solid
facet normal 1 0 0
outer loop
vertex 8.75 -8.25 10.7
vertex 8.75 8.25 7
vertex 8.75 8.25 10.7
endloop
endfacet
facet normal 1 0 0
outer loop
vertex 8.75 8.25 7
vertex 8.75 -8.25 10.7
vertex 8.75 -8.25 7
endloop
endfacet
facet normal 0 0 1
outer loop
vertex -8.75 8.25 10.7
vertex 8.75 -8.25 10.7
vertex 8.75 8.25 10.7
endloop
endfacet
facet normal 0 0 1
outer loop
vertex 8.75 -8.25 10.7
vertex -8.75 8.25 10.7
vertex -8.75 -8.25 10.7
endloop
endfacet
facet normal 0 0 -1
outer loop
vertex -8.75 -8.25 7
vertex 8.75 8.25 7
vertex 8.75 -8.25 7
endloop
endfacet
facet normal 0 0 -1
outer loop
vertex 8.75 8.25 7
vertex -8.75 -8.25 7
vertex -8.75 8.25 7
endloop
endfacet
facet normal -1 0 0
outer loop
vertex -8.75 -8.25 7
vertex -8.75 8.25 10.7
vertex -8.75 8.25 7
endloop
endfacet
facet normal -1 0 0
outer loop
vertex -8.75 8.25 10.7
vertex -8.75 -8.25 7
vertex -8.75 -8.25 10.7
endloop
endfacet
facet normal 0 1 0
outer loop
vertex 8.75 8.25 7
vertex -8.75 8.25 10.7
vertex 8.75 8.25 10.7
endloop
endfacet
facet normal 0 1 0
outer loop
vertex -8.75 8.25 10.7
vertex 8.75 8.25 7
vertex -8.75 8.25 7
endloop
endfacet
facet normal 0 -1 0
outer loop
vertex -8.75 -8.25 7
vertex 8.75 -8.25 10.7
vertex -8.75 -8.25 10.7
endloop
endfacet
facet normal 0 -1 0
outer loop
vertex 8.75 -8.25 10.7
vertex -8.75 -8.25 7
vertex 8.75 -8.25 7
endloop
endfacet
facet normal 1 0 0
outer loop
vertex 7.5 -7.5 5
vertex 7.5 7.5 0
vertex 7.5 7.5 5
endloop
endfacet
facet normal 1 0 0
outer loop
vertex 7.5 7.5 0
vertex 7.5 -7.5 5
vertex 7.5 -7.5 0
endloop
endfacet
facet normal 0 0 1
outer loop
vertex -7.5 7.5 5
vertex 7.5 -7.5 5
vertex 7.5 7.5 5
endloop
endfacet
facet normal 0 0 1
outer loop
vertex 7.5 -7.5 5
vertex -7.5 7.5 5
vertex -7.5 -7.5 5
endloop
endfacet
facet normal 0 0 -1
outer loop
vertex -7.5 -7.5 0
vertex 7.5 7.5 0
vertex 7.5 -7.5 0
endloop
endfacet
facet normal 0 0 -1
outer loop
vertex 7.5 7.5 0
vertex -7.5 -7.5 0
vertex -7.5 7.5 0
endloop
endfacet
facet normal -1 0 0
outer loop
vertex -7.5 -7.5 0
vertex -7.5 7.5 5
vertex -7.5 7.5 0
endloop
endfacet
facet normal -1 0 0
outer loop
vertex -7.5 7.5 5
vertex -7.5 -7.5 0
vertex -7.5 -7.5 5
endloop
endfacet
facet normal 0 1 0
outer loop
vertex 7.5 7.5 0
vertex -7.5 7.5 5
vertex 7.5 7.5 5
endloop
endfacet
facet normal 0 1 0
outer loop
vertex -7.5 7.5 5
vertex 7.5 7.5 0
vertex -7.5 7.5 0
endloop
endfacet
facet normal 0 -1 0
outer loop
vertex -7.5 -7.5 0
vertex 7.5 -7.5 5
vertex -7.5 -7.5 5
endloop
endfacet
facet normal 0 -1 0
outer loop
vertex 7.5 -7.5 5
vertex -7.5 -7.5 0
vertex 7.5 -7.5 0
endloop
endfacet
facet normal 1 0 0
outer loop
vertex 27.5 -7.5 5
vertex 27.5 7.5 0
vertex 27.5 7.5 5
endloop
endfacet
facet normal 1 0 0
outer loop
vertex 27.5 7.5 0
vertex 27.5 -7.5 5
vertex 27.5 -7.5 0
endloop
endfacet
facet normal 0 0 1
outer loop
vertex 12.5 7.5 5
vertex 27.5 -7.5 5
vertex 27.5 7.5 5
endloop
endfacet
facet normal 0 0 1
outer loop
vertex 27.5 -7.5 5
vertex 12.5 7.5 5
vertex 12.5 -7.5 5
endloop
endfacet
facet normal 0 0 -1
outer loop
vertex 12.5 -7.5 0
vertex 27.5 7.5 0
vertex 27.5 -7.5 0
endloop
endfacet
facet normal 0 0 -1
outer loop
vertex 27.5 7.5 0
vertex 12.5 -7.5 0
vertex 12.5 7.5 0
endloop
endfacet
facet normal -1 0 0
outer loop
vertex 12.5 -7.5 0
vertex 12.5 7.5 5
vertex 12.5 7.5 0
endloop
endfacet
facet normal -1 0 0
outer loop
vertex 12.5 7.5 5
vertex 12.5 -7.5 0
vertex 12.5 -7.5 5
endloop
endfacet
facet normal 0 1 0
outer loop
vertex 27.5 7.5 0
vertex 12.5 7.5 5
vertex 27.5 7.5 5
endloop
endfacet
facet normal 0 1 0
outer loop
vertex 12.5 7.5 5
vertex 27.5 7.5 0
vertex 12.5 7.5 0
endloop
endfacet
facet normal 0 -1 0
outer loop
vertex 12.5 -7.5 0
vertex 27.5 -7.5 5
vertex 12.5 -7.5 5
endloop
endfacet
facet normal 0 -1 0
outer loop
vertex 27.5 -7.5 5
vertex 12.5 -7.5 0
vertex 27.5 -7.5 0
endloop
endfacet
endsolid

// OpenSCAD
module choc_v1(c="Indigo") {
  // $fs = 0.02;
  color(c)
  difference() {
    translate([0,0,2.5])
    cube([15, 15, 5], center=true);
    // cylinder(h=1, d=3.40, center=true);
  }
}

module choc_1u_kc(c="Ivory") {
  color(c)
  translate([0,0,1.85])
  cube([17.5, 16.5, 3.7], center=true);
}

module choc_1p5u_kc(c="Ivory") {
  color(c)
  translate([0,0,1.85])
  cube([26.5, 16.5, 3.7], center=true);
}

module choc_1p5uR_kc(c="Ivory") {
  color(c)
  translate([0,0,1.85])
  cube([16.5, 26.5, 3.7], center=true);
}

module choc_1u(s="", c="Ivory", with_kc=true) {
  choc_v1();
  if (with_kc) {
    translate([0,0,7])
    difference() {
      choc_1u_kc(c=c);
      translate([0,0,3.5]) text(s, size=5, halign="center", valign="center");
    }
  }
}

module choc_1p5u(c="Ivory", with_kc=true) {
  choc_v1();
  if (with_kc) {
    translate([0,0,7])
    choc_1p5u_kc(c=c);
  }
}

module choc_1p5uR(c="Ivory", with_kc=true) {
  choc_v1();
  if (with_kc) {
    translate([0,0,7])
    choc_1p5uR_kc(c=c);
  }
}

choc_1u("A");
translate([20,0,0])
choc_1u(with_kc=false);
